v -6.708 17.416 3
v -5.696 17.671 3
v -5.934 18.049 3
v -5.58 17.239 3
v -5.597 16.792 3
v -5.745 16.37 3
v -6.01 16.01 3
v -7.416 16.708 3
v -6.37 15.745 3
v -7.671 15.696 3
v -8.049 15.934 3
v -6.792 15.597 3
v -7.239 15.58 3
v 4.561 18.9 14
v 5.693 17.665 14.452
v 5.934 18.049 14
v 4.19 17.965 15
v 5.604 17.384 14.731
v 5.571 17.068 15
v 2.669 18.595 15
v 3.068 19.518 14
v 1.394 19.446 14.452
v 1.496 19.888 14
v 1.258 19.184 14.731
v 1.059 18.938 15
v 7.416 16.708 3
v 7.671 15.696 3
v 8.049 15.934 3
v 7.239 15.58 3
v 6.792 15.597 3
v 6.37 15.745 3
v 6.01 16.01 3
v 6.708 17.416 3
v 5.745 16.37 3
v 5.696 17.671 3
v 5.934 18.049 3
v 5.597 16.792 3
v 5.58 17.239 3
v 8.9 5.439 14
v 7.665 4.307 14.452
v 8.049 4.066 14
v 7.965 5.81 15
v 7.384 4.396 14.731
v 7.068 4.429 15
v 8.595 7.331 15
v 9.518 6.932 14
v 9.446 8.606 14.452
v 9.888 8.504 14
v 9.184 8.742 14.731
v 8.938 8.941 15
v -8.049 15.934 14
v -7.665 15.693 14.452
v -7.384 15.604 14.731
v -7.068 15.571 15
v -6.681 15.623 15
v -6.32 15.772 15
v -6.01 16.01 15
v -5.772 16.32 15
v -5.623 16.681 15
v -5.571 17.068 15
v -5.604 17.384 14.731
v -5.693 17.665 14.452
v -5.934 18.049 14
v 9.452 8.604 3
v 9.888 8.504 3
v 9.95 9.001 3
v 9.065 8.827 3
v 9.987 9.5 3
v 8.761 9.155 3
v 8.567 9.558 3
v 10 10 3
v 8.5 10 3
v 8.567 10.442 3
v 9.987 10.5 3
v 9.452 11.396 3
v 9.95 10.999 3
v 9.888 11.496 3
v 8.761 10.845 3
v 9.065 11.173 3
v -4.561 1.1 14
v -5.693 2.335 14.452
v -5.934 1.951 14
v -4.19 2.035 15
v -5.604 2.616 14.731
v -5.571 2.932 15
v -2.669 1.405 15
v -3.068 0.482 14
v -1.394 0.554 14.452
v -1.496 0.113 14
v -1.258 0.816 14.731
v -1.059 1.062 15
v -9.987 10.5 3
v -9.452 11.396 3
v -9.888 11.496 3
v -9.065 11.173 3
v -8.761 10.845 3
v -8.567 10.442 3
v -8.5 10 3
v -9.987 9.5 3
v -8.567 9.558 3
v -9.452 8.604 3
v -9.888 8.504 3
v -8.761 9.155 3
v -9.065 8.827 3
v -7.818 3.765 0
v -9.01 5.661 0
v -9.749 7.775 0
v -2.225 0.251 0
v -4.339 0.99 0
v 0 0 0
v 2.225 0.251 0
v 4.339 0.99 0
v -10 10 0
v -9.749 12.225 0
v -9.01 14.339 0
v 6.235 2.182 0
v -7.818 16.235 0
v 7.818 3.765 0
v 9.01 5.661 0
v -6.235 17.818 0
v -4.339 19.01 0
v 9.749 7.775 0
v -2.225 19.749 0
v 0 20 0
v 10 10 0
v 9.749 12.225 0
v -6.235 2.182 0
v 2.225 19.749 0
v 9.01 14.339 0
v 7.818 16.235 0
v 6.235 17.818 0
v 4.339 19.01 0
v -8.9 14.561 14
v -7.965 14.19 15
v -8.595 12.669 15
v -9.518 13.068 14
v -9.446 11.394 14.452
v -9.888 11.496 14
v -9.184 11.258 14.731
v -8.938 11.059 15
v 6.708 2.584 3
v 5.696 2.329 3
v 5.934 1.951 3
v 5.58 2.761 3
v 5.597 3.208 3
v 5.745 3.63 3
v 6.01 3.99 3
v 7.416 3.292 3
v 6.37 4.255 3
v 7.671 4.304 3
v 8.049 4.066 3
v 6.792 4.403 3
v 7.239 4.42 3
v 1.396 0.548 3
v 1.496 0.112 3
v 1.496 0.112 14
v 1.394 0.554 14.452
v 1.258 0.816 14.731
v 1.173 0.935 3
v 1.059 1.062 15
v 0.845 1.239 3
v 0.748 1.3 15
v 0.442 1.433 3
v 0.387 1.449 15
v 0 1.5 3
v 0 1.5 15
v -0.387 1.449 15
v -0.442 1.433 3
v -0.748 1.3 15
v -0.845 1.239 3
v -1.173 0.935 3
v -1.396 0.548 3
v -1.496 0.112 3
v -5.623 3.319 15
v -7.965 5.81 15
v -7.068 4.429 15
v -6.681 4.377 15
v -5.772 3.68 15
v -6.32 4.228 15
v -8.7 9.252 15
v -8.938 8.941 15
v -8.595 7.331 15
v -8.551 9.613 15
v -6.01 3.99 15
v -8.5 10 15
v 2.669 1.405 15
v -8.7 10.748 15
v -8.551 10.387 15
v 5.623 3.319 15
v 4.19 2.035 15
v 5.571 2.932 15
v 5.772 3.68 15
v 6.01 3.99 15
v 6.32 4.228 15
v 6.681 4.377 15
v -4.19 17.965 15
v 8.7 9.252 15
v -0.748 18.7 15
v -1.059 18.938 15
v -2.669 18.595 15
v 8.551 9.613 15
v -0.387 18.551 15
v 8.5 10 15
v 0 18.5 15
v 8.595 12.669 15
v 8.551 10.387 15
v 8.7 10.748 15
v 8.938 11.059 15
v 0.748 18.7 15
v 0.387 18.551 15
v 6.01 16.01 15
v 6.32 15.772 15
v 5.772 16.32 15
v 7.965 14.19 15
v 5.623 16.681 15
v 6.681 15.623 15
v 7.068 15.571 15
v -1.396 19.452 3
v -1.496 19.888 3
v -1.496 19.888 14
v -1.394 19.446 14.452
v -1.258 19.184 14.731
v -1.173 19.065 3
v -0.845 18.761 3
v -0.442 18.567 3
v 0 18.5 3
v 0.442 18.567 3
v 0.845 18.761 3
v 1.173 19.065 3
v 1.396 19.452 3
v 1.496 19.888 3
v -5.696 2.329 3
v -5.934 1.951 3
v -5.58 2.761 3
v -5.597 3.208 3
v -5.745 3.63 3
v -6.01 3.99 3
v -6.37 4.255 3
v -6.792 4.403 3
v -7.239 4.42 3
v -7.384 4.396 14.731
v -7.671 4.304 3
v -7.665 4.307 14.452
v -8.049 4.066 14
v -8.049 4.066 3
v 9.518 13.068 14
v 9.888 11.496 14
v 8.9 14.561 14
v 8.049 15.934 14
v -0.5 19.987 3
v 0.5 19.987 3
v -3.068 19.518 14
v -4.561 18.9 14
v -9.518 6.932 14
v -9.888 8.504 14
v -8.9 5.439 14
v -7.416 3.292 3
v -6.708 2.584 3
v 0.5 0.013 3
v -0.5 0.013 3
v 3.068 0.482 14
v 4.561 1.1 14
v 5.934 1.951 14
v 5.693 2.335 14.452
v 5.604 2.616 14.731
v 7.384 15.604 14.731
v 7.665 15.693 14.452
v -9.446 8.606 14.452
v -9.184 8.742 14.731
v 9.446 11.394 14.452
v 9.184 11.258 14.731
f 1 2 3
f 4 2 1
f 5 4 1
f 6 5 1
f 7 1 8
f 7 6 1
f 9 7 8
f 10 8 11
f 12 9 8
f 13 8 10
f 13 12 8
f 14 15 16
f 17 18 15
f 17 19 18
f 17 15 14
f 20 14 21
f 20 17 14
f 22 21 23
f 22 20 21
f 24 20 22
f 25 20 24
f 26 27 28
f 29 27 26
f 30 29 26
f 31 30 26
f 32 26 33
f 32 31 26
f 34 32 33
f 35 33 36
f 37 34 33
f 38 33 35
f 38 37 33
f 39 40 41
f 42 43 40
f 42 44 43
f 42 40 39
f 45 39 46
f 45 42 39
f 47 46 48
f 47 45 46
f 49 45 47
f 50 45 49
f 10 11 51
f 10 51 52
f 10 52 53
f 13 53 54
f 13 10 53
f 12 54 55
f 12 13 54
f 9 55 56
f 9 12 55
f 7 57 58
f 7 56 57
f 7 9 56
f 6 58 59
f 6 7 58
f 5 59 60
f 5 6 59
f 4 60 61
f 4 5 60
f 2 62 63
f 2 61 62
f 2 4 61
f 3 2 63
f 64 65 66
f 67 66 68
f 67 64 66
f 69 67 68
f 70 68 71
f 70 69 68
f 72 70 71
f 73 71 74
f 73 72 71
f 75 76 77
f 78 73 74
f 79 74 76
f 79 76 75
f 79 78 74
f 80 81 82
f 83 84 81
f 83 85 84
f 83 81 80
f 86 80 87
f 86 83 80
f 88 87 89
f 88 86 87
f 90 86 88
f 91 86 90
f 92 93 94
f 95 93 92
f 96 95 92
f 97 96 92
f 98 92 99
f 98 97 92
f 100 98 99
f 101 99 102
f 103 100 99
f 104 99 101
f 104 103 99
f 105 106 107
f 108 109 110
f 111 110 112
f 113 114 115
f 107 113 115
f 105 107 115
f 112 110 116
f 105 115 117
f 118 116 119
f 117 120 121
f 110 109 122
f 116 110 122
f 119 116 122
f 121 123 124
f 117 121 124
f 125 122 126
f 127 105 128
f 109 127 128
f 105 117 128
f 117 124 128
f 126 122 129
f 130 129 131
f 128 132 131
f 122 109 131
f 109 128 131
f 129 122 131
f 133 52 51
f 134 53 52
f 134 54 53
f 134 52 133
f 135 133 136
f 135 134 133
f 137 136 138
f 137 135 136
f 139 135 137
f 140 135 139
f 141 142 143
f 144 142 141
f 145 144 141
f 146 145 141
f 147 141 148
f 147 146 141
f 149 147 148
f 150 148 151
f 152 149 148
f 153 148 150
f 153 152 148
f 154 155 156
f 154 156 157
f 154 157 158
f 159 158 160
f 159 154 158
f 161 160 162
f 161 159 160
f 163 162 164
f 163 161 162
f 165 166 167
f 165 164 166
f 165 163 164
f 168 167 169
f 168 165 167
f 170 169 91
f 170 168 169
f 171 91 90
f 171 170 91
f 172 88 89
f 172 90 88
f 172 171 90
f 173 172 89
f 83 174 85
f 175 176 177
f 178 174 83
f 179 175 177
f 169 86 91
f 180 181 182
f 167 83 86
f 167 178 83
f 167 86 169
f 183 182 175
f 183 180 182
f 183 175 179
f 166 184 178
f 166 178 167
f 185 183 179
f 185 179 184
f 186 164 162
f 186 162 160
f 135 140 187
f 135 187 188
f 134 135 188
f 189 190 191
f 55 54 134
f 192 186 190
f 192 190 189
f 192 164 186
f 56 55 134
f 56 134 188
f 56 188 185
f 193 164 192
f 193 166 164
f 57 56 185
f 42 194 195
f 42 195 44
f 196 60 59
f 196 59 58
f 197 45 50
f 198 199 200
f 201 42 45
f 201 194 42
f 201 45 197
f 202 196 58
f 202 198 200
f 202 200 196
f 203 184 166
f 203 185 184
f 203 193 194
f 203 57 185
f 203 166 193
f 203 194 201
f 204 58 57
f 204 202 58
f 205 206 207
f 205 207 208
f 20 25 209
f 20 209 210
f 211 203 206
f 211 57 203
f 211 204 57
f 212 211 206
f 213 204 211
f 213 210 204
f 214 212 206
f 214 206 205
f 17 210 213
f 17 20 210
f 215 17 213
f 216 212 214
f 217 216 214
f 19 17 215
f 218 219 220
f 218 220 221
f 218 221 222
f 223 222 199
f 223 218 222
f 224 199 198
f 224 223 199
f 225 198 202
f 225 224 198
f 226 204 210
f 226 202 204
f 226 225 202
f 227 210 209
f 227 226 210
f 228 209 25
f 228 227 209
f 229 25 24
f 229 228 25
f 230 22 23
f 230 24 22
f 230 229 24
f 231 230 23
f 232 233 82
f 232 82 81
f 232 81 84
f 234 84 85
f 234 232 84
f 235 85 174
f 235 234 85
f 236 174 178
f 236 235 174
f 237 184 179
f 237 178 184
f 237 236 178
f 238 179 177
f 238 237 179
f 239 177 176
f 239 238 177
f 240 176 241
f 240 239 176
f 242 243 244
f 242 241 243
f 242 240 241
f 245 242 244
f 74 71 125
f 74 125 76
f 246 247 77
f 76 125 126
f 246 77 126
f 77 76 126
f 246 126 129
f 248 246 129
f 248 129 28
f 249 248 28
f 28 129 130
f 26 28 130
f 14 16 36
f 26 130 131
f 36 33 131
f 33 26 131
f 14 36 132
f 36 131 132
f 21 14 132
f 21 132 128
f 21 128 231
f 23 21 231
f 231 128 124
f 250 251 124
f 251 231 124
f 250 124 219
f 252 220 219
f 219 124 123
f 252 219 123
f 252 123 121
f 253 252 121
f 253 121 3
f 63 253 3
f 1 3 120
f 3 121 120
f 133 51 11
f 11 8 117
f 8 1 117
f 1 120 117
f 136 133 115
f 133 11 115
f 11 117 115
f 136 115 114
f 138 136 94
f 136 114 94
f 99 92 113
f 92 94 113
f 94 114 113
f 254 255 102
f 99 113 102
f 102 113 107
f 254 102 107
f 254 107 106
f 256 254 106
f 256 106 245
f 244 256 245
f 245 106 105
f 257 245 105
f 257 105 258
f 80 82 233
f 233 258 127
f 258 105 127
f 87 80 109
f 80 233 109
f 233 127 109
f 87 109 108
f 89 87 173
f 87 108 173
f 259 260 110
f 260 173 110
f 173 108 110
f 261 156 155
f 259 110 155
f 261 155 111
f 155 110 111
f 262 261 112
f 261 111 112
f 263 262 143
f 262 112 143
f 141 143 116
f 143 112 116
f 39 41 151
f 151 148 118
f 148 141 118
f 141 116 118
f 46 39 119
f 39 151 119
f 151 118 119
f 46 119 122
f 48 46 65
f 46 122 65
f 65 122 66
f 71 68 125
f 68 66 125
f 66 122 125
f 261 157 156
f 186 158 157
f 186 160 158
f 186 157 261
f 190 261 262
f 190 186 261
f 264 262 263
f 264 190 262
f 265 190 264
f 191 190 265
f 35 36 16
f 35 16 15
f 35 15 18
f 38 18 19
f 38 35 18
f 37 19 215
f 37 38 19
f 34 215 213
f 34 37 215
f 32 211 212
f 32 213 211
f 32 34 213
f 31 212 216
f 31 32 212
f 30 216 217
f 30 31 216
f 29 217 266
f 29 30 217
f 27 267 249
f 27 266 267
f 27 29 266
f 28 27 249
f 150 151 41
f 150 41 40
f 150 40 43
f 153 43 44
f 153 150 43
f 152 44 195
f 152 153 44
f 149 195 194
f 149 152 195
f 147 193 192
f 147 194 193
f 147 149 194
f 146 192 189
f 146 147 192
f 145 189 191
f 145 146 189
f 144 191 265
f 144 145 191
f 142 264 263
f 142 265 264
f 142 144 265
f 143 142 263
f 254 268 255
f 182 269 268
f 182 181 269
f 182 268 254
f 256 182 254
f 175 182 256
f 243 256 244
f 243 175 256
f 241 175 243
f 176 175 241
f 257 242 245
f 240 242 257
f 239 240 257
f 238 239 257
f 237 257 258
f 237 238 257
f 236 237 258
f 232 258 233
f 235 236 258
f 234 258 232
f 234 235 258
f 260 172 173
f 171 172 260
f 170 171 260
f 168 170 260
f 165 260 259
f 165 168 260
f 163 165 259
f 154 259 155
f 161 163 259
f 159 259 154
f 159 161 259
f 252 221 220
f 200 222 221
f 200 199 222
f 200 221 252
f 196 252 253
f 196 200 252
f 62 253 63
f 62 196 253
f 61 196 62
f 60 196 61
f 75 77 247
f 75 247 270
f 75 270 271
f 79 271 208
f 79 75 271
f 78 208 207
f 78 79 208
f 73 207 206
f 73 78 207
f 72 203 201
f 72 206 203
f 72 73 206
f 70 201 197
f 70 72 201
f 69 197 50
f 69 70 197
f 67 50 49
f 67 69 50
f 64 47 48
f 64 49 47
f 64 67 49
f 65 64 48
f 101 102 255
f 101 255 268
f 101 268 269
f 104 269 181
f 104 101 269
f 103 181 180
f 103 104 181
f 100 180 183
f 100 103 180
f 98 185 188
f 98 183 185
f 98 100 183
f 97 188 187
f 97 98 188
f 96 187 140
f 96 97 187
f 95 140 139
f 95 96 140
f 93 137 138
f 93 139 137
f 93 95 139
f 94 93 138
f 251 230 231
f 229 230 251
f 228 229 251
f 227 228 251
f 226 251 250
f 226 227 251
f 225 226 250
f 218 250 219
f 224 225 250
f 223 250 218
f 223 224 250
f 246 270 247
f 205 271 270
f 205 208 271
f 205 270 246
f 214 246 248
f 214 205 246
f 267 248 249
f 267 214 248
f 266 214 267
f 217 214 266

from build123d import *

# Parameters (mm, degrees)
CYLINDER003_R     = 1.5
CYLINDER003_DEPTH = 40
ARRAY001_COUNT    = 8
CYLINDER002_R     = 10
CYLINDER002_DEPTH = 15
CHAMFER_SIZE      = 1
CHAMFER001_SIZE   = 1
CHAMFER002_SIZE   = 1
CHAMFER003_SIZE   = 1
CHAMFER004_SIZE   = 1
CHAMFER005_SIZE   = 1
CHAMFER006_SIZE   = 1
CHAMFER007_SIZE   = 1


with BuildPart() as array001:
    # Cylinder003 → Cylinder003 (new body)
    with BuildSketch(Plane.XY):
        Circle(CYLINDER003_R)
    extrude(amount=CYLINDER003_DEPTH)

    # Array001: Array001 ×8 about axis
    array001_axis = Axis((0, 10, 0), (0, 0, 1))


with BuildPart() as array001_1:
    add(array001.part)
    for i in range(1, ARRAY001_COUNT):
        add(array001.part.rotate(array001_axis, i * 360 / ARRAY001_COUNT))


with BuildPart() as array001_2:
    # Array001 placement: moved
    add(array001_1.part.moved(Location((0, 0, 3))))


with BuildPart() as chamfer007:
    # Cylinder002 → Cylinder002 (new body)
    with BuildSketch(Plane(origin=(0, 10, 0), x_dir=(1, 0, 0), z_dir=(0, 0, 1))):
        Circle(CYLINDER002_R)
    extrude(amount=CYLINDER002_DEPTH)

    # Cut001: cut Array001
    add(array001_2.part, mode=Mode.SUBTRACT)

    # Chamfer
    chamfer_edges = [chamfer007.edges().sort_by_distance(p)[0] for p in [
        (-3.826834, 0.761205, 15),
    ]]
    chamfer(chamfer_edges, length=CHAMFER_SIZE)

    # Chamfer001
    chamfer001_edges = [chamfer007.edges().sort_by_distance(p)[0] for p in [
        (3.826834, 0.761205, 15),
    ]]
    chamfer(chamfer001_edges, length=CHAMFER001_SIZE)

    # Chamfer002
    chamfer002_edges = [chamfer007.edges().sort_by_distance(p)[0] for p in [
        (-9.238795, 6.173166, 15),
    ]]
    chamfer(chamfer002_edges, length=CHAMFER002_SIZE)

    # Chamfer003
    chamfer003_edges = [chamfer007.edges().sort_by_distance(p)[0] for p in [
        (9.238795, 6.173166, 15),
    ]]
    chamfer(chamfer003_edges, length=CHAMFER003_SIZE)

    # Chamfer004
    chamfer004_edges = [chamfer007.edges().sort_by_distance(p)[0] for p in [
        (9.238795, 13.826834, 15),
    ]]
    chamfer(chamfer004_edges, length=CHAMFER004_SIZE)

    # Chamfer005
    chamfer005_edges = [chamfer007.edges().sort_by_distance(p)[0] for p in [
        (3.826834, 19.238795, 15),
    ]]
    chamfer(chamfer005_edges, length=CHAMFER005_SIZE)

    # Chamfer006
    chamfer006_edges = [chamfer007.edges().sort_by_distance(p)[0] for p in [
        (-9.238795, 13.826834, 15),
    ]]
    chamfer(chamfer006_edges, length=CHAMFER006_SIZE)

    # Chamfer007
    chamfer007_edges = [chamfer007.edges().sort_by_distance(p)[0] for p in [
        (-3.826834, 19.238795, 15),
    ]]
    chamfer(chamfer007_edges, length=CHAMFER007_SIZE)


solid = chamfer007.part
